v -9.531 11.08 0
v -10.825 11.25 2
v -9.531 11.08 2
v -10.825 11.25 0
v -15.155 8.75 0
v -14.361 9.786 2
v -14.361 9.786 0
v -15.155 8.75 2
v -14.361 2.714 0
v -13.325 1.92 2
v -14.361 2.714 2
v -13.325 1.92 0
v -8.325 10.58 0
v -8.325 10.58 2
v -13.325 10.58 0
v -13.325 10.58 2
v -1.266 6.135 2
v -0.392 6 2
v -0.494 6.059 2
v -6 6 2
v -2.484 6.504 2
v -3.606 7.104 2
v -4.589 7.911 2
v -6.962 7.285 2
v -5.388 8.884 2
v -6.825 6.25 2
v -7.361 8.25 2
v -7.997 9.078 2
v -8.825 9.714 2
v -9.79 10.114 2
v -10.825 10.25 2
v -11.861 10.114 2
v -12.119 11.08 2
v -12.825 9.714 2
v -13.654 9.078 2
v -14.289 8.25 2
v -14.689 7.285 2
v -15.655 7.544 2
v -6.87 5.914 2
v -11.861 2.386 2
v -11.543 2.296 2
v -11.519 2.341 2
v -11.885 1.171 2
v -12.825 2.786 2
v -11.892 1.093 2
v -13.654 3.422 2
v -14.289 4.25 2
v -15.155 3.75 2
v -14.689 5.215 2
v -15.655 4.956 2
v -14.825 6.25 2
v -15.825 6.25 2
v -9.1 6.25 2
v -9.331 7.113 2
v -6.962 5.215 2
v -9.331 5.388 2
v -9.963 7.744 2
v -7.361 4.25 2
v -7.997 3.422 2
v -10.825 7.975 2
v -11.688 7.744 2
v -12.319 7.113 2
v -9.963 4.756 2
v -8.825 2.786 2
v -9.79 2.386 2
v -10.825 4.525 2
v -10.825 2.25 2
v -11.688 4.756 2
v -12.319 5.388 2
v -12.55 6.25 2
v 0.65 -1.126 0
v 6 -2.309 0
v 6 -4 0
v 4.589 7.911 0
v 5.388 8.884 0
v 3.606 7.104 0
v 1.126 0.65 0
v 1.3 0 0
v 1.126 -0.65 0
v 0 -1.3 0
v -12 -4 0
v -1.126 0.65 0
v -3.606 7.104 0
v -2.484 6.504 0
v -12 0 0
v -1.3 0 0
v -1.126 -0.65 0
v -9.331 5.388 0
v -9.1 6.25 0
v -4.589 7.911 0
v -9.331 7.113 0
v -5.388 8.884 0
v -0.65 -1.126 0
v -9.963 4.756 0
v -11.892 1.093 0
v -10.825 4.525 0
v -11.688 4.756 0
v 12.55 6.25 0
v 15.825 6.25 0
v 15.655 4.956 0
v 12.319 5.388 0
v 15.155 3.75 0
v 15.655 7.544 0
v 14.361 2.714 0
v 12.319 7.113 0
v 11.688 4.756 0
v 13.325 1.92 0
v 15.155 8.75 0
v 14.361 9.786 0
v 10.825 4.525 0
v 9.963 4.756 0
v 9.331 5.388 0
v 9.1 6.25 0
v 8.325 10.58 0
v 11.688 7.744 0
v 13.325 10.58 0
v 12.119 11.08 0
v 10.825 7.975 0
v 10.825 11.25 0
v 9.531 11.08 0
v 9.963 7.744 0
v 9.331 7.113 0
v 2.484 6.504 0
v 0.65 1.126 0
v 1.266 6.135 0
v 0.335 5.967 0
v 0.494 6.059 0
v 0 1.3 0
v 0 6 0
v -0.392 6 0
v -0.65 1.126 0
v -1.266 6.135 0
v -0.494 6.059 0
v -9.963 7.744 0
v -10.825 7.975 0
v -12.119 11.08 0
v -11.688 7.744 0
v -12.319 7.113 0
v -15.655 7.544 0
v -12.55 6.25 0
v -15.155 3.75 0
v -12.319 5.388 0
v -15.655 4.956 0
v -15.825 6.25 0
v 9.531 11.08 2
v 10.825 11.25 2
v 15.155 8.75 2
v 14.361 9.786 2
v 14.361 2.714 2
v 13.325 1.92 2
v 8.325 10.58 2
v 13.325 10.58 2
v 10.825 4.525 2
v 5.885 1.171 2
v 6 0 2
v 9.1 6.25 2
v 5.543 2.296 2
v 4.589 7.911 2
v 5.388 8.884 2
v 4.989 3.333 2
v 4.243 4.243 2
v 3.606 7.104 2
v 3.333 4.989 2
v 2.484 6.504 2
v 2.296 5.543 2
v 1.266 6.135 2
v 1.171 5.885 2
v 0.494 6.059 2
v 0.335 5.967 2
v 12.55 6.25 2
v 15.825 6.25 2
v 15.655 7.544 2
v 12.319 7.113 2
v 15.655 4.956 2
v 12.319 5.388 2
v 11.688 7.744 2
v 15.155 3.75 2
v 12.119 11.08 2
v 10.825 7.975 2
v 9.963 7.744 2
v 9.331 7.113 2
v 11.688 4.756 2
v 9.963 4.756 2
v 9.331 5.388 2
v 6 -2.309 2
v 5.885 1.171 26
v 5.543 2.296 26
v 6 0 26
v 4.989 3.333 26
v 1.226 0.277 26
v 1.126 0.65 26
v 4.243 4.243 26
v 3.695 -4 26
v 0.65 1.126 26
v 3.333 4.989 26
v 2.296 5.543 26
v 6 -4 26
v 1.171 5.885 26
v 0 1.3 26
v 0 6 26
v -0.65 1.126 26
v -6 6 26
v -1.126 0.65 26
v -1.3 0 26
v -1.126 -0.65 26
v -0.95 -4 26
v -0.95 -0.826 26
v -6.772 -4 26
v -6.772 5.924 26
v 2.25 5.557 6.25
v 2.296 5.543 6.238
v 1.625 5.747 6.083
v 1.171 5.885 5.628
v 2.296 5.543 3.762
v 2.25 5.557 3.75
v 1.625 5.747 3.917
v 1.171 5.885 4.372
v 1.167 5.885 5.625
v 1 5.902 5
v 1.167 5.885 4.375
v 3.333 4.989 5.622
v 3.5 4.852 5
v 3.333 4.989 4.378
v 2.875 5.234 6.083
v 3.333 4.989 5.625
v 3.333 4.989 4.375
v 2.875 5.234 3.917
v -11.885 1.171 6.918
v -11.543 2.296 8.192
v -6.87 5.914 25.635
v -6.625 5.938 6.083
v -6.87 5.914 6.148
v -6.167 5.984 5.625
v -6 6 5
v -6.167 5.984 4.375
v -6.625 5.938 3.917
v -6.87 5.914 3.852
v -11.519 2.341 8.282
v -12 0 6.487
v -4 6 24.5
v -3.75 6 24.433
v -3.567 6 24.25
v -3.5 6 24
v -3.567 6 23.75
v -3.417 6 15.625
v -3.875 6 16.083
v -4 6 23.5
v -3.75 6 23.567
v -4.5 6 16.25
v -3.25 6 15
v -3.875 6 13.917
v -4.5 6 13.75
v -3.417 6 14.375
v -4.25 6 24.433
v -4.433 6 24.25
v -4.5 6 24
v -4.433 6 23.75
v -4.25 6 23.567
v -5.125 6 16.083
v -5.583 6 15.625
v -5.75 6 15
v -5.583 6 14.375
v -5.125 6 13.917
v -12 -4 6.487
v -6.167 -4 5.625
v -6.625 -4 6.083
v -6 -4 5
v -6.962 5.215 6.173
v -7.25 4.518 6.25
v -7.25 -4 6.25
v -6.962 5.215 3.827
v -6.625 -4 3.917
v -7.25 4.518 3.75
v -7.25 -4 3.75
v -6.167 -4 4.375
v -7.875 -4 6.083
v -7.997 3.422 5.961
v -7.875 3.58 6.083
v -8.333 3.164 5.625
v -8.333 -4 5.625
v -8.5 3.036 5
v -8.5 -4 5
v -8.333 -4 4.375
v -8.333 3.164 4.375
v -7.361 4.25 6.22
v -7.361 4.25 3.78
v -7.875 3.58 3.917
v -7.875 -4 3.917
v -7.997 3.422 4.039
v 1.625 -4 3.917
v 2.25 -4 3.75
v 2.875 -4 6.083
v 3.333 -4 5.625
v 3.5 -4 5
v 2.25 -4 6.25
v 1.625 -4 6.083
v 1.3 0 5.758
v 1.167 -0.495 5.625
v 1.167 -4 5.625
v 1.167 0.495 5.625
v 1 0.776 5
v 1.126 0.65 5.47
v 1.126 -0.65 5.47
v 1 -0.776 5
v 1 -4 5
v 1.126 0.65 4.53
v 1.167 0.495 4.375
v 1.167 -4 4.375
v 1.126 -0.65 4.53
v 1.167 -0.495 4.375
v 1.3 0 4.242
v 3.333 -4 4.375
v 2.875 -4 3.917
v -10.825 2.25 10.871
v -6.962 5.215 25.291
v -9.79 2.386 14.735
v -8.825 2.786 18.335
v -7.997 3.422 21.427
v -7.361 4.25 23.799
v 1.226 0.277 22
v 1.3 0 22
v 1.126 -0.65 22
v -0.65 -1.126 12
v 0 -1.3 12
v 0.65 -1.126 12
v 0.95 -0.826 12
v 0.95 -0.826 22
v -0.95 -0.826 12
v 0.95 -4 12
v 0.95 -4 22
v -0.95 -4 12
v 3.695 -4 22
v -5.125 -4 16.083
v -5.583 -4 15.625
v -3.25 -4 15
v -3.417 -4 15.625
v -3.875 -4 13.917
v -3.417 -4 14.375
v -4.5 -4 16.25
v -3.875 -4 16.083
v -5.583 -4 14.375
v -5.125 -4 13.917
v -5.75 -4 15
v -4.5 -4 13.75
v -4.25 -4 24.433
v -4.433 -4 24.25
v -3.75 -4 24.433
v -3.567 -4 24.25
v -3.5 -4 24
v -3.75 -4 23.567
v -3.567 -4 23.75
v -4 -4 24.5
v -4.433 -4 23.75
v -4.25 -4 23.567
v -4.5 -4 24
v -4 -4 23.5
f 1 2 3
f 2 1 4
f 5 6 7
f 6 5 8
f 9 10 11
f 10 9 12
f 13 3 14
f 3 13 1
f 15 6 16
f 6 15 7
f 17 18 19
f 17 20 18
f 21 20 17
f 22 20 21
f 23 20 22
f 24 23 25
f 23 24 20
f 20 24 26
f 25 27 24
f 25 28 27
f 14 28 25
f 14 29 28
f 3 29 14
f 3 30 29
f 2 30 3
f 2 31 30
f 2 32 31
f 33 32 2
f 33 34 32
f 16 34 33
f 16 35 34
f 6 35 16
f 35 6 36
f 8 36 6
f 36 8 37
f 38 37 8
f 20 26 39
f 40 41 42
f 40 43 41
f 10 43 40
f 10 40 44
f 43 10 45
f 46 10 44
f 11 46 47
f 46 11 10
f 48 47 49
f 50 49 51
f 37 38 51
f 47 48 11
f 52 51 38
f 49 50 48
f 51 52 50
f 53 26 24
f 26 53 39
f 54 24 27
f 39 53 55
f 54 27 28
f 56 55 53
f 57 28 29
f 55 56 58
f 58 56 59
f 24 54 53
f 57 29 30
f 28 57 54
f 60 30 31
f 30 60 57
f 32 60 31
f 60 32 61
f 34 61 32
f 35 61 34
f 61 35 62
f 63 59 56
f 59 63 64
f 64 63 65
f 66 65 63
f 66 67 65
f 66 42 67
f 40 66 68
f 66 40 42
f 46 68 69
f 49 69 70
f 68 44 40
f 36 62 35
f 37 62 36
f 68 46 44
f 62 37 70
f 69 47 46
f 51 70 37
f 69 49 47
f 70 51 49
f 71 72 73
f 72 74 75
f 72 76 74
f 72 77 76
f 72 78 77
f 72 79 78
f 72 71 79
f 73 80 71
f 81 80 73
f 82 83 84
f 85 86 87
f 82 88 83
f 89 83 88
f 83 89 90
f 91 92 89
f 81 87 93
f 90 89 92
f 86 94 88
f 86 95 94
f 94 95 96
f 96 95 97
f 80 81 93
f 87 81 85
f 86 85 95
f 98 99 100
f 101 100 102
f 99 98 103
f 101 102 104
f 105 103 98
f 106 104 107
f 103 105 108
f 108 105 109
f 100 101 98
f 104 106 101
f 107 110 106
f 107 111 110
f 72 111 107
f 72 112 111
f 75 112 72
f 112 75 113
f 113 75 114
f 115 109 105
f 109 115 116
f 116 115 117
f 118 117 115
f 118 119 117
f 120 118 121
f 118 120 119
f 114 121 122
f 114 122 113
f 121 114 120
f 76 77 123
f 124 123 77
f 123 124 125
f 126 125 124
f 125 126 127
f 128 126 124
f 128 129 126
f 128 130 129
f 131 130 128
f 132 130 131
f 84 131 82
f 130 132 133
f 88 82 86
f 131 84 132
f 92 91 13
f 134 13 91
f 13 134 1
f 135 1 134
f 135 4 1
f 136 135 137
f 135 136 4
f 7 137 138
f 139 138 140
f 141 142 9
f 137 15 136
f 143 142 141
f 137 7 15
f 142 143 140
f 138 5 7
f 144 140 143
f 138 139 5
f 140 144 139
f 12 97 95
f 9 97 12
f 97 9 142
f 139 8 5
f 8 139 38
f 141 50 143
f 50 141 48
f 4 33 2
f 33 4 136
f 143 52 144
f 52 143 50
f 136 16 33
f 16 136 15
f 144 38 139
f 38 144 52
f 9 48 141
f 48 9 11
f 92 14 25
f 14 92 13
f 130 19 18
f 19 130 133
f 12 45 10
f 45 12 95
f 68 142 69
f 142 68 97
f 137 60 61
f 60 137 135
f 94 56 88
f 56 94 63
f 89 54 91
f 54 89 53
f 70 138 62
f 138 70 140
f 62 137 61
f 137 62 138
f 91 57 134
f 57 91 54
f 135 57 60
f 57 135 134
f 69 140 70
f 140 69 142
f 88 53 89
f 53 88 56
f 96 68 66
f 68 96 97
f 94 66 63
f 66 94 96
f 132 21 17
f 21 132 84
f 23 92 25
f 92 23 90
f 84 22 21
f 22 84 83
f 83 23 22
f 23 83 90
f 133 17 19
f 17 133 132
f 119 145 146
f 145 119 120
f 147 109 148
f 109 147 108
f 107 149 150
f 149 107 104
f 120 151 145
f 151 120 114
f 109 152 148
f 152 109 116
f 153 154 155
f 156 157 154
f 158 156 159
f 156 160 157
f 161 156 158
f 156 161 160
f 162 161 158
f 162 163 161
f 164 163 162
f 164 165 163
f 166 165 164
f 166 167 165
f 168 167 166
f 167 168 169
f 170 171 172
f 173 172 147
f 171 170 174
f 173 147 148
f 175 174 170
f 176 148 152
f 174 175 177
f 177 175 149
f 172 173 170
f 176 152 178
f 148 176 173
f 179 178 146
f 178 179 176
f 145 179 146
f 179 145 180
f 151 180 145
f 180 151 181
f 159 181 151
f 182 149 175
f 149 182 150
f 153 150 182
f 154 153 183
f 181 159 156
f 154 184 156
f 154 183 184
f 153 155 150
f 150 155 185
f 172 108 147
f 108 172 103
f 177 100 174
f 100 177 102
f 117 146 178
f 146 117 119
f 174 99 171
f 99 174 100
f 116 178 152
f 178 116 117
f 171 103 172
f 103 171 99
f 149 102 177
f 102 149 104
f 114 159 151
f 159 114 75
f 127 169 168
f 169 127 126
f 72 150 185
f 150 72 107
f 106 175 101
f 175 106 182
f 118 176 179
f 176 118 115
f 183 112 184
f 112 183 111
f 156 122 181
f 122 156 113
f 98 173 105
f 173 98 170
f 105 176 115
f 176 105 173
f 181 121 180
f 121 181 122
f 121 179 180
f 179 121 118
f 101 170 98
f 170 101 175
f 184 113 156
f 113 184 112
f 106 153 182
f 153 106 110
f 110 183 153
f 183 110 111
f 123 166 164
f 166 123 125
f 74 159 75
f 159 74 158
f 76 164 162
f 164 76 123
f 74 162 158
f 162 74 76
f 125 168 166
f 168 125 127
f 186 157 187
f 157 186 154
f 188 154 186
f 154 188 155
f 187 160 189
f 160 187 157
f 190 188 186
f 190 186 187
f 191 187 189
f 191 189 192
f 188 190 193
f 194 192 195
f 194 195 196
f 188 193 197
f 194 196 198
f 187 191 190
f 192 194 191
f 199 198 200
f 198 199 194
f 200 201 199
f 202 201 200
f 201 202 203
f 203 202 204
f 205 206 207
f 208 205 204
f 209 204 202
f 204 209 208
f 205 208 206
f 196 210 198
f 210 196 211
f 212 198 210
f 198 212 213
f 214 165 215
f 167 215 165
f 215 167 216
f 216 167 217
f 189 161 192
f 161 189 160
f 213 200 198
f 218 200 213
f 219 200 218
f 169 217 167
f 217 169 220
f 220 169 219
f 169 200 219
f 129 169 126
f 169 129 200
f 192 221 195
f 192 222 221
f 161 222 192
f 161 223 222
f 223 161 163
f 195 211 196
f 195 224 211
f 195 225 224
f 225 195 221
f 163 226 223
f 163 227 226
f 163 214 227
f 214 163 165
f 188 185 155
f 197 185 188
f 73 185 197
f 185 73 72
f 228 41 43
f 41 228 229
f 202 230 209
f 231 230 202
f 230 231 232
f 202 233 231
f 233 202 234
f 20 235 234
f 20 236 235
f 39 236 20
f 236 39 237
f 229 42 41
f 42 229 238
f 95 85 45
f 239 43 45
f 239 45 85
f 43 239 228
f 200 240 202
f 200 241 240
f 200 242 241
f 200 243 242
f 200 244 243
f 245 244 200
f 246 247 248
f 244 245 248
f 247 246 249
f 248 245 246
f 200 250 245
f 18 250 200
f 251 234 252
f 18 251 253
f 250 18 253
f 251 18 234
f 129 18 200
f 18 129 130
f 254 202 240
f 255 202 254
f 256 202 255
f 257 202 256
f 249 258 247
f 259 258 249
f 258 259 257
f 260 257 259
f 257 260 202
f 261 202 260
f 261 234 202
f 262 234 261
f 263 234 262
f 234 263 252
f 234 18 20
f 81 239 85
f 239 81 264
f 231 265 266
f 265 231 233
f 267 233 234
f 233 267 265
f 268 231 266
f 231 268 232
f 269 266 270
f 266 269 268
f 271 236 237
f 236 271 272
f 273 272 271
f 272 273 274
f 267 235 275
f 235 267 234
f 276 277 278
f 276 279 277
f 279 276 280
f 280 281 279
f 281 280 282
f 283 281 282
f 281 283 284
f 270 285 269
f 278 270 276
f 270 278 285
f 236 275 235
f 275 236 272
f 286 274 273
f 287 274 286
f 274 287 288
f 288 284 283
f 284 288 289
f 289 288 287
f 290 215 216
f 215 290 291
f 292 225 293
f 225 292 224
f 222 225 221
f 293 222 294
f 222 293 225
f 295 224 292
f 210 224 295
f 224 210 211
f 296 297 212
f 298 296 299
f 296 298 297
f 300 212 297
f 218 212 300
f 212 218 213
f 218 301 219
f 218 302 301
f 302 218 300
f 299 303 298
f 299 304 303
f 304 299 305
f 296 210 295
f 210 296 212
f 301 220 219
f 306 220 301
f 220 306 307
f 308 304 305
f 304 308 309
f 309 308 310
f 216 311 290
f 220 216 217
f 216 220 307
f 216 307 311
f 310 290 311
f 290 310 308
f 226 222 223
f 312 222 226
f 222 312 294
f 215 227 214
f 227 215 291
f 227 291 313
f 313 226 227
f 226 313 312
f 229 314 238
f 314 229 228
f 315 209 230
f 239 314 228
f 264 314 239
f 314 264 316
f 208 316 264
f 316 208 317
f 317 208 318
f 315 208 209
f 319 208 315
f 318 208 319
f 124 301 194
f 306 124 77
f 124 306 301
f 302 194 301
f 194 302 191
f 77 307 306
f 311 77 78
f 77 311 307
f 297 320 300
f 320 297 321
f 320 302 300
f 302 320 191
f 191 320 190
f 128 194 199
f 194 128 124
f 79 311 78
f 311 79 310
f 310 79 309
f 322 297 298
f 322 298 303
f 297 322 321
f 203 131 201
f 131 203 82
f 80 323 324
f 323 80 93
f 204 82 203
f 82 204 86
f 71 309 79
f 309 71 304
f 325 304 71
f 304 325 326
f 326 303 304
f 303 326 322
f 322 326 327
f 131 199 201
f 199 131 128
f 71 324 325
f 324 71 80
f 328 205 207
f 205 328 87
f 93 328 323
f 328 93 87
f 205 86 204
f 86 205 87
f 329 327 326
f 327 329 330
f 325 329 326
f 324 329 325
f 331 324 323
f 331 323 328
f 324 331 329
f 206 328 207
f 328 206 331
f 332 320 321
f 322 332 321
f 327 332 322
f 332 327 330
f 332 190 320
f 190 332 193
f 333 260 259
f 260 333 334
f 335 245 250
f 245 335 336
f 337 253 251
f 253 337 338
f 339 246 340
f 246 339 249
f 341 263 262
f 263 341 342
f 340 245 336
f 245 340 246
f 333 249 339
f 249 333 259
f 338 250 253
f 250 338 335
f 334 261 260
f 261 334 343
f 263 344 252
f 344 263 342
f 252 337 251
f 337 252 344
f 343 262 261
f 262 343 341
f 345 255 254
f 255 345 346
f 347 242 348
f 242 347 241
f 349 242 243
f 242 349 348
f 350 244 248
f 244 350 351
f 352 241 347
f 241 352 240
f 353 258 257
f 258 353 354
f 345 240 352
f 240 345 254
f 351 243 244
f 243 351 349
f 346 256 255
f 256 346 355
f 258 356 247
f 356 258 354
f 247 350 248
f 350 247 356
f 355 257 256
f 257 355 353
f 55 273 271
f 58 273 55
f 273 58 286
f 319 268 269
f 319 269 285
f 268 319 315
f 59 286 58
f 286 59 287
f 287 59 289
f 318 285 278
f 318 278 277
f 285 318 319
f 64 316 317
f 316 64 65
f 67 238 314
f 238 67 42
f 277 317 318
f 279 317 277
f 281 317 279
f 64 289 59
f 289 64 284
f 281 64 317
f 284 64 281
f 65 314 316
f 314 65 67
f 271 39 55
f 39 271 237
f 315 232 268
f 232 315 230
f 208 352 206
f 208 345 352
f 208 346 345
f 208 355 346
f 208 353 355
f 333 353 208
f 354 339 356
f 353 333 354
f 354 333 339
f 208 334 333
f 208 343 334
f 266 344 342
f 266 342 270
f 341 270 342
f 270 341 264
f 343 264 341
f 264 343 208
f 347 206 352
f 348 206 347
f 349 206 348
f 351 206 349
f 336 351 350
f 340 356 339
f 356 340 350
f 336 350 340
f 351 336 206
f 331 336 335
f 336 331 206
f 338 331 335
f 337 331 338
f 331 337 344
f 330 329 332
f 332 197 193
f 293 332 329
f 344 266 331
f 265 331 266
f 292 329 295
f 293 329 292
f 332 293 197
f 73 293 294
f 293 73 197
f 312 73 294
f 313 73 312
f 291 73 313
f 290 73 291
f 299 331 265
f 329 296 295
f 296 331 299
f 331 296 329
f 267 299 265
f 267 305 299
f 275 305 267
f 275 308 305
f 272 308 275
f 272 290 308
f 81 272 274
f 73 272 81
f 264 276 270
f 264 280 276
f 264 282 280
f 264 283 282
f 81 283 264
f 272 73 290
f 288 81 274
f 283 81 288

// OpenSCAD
// file: microswitch.scad
// Don't print this file, purchase real micro switches
// e.g. Honeywell ZM10B10A01 or OMRON SS-5 or similar.

module microswitch() {
  difference() {
    union() {
      translate([0, 0, 2.5])
        cube([19.8, 6, 10], center=true);
      translate([2.5, 0.5, 6])
        cube([2, 3.5, 5], center=true);
      for (x = [-8, -1, 8]) {
        translate([x, 0, 0])
          cube([0.6, 3.2, 13], center=true);
      }
    }
    for (x = [-9.5/2, 9.5/2]) {
      translate([x, 0, 0]) rotate([90, 0, 0])
        cylinder(r=2.5/2, h=20, center=true, $fn=12);
    }
  }
}

microswitch();
// file: configuration.scad
// Increase this if your slicer or printer make holes too tight.
extra_radius = 0.1;

// OD = outside diameter, corner to corner.
m3_nut_od = 6.1;
m3_nut_radius = m3_nut_od/2 + 0.2 + extra_radius;
m3_washer_radius = 3.5 + extra_radius;

// Major diameter of metric 3mm thread.
m3_major = 2.85;
m3_radius = m3_major/2 + extra_radius;
m3_wide_radius = m3_major/2 + extra_radius + 0.2;

// NEMA17 stepper motors.
motor_shaft_diameter = 5;
motor_shaft_radius = motor_shaft_diameter/2 + extra_radius;

// Frame brackets. M3x8mm screws work best with 3.6 mm brackets.
thickness = 3.6;

// OpenBeam or Misumi. Currently only 15x15 mm, but there is a plan
// to make models more parametric and allow 20x20 mm in the future.
extrusion = 15;

// Placement for the NEMA17 stepper motors.
motor_offset = 44;
motor_length = 47;
// main file
include <configuration.scad>;

use <microswitch.scad>;

height = 26;
height2 = 26;
tunnel = 2.4;
face_offset = 4;

module foot() {
  difference() {
    translate([12.5, 0, 0]) rotate([0, 0, -60])
      translate([-12.5, 0, 1]) rotate([0, 0, -60]) union() {
        cylinder(r=5, h=2, center=true, $fn=24);
        translate([10, 0, 0])
          cube([20, 10, 2], center=true);
    }
    translate([0, -10, 0])
      cube([40, 20, 20], center=true);
    translate([12.5, 0, 0]) {
      // Space for bowden push fit connector.
      cylinder(r=6.49, h=3*height, center=true, $fn=32);
      for (a = [60:120:359]) {
	    rotate([0, 0, a]) translate([-12.5, 0, 0])
          cylinder(r=m3_wide_radius, h=20, center=true, $fn=12);
      }
    }
  }
}

module retractable() {
  difference() {
    union() {
      translate([0, 0, height/2])
        cylinder(r=6, h=height, center=true, $fn=32);
      translate([0, -3, height/2])
        cube([12, 6, height], center=true);
      // Lower part on the left.
      translate([-6, 0, height2/2])
        cylinder(r=6, h=height2, center=true, $fn=32);
      translate([-3, 0, height2/2])
        cube([6, 12, height2], center=true);
      translate([-3, -3, height2/2])
        cube([18, 6, height2], center=true);
      // Feet for vertical M3 screw attachment.
      rotate([0, 0, 90]) {
        foot();
        scale([1, -1, 1]) foot();
      }
    }
    translate([-19, 0, height/2+6]) rotate([0, 15, 0])
      cube([20, 20, height], center=true);
    cylinder(r=tunnel/2+extra_radius, h=3*height, center=true, $fn=12);
    translate([0, -6, height/2+12])
      cube([tunnel-0.5, 12, height], center=true);
    rotate([0, 0, 30]) translate([0, -6, height/2+22])
      cube([tunnel, 12, height], center=true);
    // Safety needle spring.
    translate([-4.5, 0, height-11]) rotate([90, 0, 0])
      cylinder(r=2.5/2, h=40, center=true, $fn=12);
    translate([-4, 0, height-2]) rotate([90, 0, 0])
      cylinder(r=1/2, h=40, center=true, $fn=12);
    // Effector screw heads.
    rotate([0, 0, 330]) translate([-12.5, 0, 2])
      cylinder(r=4, h=30, $fn=24);
    // Flat front face.
    translate([0, -face_offset-10, height/2]) difference() {
      cube([30, 20, 2*height], center=true);
    }
    // Sub-miniature micro switch.
    translate([-2.5, -face_offset-3, 5]) {
      % microswitch();
      for (x = [-9.5/2, 9.5/2]) {
        translate([x, 0, 0]) rotate([90, 0, 0])
          cylinder(r=2.5/2, h=40, center=true, $fn=12);
      }
    }
  }
}

retractable();
